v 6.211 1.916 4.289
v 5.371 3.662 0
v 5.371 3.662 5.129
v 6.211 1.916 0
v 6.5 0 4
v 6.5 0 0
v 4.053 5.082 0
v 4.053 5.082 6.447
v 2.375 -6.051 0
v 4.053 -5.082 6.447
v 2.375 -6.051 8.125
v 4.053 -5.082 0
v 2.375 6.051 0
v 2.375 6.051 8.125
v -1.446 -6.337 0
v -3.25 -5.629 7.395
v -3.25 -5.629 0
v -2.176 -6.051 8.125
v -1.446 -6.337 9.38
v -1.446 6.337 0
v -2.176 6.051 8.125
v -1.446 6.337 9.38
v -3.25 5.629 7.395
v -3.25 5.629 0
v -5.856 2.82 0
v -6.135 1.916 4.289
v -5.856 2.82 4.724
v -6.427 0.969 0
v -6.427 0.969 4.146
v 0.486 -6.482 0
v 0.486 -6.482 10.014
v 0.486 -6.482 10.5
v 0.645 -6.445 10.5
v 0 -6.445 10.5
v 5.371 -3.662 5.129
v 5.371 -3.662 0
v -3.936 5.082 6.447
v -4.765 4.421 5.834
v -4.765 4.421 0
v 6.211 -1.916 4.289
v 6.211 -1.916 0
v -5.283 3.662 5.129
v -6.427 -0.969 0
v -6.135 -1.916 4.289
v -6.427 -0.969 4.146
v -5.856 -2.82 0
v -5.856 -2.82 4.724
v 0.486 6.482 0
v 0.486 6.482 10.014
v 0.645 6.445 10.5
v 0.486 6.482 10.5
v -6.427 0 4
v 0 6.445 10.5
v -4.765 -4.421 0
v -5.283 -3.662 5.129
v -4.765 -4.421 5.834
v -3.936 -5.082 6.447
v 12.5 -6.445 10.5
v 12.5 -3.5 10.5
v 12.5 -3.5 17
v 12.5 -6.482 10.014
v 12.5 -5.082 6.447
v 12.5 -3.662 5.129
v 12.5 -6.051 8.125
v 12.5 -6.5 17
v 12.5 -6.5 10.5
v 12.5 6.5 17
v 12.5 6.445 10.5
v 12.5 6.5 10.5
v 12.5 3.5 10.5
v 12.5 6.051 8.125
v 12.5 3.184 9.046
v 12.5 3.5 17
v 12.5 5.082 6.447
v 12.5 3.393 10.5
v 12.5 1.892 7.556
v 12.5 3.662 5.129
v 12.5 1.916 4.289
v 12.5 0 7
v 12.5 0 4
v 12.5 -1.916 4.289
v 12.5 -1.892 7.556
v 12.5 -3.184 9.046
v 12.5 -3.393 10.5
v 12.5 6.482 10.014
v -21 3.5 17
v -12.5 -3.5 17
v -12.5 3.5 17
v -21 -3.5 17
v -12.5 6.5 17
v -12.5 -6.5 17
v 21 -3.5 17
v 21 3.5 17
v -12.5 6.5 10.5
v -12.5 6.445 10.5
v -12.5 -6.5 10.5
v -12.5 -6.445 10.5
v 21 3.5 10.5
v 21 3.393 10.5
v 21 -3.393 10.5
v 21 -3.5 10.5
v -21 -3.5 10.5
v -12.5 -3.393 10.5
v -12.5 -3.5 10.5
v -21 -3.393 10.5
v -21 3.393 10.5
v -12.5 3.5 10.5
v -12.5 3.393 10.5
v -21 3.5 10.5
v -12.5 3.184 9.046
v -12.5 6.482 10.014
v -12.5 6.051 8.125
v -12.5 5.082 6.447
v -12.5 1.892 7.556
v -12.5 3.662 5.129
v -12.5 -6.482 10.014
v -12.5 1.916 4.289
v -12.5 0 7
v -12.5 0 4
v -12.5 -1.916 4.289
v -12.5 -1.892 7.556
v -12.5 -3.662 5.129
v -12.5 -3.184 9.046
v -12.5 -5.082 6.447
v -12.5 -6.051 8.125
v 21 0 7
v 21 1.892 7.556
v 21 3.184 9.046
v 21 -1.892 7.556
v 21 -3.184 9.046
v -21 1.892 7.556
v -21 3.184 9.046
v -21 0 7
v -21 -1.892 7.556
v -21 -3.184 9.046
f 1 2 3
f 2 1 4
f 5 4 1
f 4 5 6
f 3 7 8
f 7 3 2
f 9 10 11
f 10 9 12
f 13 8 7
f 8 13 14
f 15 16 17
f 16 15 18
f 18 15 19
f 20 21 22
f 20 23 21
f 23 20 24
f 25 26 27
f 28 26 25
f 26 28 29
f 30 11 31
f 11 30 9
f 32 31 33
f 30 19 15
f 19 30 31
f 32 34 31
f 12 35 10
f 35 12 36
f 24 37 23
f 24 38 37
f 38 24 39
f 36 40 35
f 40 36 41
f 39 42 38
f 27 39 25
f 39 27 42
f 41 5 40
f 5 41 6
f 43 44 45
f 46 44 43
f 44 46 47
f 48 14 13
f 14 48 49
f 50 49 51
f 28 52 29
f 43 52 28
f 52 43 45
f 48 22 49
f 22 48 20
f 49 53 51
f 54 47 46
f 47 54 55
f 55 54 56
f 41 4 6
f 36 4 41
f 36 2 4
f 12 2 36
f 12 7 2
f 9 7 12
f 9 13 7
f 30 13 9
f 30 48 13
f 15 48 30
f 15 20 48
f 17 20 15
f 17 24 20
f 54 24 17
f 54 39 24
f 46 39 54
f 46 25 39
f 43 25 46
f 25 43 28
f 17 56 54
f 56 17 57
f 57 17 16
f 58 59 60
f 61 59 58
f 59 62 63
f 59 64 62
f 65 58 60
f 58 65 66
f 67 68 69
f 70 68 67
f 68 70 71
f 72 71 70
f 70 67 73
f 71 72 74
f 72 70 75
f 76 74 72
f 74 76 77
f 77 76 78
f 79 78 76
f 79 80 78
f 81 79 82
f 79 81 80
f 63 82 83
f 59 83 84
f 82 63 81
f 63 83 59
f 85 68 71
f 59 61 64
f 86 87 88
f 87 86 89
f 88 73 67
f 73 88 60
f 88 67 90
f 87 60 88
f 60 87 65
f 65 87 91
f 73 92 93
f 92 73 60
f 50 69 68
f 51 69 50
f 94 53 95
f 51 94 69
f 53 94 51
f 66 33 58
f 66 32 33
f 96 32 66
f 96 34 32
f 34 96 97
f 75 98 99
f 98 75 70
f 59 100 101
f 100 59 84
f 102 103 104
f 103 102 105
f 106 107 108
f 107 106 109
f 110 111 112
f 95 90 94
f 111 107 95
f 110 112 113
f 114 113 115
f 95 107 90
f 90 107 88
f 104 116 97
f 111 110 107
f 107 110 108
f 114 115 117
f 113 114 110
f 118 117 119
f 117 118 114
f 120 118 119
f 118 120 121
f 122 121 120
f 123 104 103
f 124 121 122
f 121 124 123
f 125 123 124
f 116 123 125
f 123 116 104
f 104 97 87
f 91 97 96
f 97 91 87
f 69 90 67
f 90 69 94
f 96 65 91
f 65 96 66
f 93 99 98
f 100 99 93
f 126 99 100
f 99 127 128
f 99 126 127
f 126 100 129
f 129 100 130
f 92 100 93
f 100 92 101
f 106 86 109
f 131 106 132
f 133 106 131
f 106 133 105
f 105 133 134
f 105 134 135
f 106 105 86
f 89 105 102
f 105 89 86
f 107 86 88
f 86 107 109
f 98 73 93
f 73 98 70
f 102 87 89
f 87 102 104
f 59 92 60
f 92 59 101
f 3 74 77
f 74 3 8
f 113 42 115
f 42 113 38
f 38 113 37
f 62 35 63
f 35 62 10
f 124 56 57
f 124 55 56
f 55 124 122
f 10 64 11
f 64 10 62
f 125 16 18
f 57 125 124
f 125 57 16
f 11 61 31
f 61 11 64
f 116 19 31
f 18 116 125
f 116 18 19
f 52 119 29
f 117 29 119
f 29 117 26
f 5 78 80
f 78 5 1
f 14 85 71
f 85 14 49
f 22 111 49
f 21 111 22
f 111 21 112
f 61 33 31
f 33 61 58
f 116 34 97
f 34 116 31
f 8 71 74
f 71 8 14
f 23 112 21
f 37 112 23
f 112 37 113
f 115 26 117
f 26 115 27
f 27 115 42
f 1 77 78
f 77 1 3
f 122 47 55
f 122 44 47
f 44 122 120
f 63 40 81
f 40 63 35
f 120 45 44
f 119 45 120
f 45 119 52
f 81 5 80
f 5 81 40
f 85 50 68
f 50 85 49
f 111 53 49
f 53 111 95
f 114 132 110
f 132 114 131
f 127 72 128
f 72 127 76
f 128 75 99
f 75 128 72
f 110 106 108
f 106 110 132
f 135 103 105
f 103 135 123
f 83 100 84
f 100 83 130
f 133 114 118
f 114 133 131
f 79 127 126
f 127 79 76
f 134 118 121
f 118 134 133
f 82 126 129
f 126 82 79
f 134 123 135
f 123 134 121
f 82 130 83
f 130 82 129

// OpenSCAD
module dripsystem_shutoff_valve() {
    union() {
        cylinder(15, 13/2, 13/2);
        translate([-25/2,-13/2,4+13/2]) {
            cube([25, 13, 13/2]);
        }
        translate([-42/2,-7/2,4+13/2]) {
            cube([42, 7, 13/2]);
        }
        translate([-25/2,0,4 + (13/2)]) {
            rotate([0,90,0]) {
                cylinder(25, 13/2, 13/2);
            }
        }
        translate([-42/2,0,4 + (13/2)]) {
            rotate([0,90,0]) {
                cylinder(42, 7/2, 7/2);
            }
        }    
    }
}

dripsystem_shutoff_valve();
